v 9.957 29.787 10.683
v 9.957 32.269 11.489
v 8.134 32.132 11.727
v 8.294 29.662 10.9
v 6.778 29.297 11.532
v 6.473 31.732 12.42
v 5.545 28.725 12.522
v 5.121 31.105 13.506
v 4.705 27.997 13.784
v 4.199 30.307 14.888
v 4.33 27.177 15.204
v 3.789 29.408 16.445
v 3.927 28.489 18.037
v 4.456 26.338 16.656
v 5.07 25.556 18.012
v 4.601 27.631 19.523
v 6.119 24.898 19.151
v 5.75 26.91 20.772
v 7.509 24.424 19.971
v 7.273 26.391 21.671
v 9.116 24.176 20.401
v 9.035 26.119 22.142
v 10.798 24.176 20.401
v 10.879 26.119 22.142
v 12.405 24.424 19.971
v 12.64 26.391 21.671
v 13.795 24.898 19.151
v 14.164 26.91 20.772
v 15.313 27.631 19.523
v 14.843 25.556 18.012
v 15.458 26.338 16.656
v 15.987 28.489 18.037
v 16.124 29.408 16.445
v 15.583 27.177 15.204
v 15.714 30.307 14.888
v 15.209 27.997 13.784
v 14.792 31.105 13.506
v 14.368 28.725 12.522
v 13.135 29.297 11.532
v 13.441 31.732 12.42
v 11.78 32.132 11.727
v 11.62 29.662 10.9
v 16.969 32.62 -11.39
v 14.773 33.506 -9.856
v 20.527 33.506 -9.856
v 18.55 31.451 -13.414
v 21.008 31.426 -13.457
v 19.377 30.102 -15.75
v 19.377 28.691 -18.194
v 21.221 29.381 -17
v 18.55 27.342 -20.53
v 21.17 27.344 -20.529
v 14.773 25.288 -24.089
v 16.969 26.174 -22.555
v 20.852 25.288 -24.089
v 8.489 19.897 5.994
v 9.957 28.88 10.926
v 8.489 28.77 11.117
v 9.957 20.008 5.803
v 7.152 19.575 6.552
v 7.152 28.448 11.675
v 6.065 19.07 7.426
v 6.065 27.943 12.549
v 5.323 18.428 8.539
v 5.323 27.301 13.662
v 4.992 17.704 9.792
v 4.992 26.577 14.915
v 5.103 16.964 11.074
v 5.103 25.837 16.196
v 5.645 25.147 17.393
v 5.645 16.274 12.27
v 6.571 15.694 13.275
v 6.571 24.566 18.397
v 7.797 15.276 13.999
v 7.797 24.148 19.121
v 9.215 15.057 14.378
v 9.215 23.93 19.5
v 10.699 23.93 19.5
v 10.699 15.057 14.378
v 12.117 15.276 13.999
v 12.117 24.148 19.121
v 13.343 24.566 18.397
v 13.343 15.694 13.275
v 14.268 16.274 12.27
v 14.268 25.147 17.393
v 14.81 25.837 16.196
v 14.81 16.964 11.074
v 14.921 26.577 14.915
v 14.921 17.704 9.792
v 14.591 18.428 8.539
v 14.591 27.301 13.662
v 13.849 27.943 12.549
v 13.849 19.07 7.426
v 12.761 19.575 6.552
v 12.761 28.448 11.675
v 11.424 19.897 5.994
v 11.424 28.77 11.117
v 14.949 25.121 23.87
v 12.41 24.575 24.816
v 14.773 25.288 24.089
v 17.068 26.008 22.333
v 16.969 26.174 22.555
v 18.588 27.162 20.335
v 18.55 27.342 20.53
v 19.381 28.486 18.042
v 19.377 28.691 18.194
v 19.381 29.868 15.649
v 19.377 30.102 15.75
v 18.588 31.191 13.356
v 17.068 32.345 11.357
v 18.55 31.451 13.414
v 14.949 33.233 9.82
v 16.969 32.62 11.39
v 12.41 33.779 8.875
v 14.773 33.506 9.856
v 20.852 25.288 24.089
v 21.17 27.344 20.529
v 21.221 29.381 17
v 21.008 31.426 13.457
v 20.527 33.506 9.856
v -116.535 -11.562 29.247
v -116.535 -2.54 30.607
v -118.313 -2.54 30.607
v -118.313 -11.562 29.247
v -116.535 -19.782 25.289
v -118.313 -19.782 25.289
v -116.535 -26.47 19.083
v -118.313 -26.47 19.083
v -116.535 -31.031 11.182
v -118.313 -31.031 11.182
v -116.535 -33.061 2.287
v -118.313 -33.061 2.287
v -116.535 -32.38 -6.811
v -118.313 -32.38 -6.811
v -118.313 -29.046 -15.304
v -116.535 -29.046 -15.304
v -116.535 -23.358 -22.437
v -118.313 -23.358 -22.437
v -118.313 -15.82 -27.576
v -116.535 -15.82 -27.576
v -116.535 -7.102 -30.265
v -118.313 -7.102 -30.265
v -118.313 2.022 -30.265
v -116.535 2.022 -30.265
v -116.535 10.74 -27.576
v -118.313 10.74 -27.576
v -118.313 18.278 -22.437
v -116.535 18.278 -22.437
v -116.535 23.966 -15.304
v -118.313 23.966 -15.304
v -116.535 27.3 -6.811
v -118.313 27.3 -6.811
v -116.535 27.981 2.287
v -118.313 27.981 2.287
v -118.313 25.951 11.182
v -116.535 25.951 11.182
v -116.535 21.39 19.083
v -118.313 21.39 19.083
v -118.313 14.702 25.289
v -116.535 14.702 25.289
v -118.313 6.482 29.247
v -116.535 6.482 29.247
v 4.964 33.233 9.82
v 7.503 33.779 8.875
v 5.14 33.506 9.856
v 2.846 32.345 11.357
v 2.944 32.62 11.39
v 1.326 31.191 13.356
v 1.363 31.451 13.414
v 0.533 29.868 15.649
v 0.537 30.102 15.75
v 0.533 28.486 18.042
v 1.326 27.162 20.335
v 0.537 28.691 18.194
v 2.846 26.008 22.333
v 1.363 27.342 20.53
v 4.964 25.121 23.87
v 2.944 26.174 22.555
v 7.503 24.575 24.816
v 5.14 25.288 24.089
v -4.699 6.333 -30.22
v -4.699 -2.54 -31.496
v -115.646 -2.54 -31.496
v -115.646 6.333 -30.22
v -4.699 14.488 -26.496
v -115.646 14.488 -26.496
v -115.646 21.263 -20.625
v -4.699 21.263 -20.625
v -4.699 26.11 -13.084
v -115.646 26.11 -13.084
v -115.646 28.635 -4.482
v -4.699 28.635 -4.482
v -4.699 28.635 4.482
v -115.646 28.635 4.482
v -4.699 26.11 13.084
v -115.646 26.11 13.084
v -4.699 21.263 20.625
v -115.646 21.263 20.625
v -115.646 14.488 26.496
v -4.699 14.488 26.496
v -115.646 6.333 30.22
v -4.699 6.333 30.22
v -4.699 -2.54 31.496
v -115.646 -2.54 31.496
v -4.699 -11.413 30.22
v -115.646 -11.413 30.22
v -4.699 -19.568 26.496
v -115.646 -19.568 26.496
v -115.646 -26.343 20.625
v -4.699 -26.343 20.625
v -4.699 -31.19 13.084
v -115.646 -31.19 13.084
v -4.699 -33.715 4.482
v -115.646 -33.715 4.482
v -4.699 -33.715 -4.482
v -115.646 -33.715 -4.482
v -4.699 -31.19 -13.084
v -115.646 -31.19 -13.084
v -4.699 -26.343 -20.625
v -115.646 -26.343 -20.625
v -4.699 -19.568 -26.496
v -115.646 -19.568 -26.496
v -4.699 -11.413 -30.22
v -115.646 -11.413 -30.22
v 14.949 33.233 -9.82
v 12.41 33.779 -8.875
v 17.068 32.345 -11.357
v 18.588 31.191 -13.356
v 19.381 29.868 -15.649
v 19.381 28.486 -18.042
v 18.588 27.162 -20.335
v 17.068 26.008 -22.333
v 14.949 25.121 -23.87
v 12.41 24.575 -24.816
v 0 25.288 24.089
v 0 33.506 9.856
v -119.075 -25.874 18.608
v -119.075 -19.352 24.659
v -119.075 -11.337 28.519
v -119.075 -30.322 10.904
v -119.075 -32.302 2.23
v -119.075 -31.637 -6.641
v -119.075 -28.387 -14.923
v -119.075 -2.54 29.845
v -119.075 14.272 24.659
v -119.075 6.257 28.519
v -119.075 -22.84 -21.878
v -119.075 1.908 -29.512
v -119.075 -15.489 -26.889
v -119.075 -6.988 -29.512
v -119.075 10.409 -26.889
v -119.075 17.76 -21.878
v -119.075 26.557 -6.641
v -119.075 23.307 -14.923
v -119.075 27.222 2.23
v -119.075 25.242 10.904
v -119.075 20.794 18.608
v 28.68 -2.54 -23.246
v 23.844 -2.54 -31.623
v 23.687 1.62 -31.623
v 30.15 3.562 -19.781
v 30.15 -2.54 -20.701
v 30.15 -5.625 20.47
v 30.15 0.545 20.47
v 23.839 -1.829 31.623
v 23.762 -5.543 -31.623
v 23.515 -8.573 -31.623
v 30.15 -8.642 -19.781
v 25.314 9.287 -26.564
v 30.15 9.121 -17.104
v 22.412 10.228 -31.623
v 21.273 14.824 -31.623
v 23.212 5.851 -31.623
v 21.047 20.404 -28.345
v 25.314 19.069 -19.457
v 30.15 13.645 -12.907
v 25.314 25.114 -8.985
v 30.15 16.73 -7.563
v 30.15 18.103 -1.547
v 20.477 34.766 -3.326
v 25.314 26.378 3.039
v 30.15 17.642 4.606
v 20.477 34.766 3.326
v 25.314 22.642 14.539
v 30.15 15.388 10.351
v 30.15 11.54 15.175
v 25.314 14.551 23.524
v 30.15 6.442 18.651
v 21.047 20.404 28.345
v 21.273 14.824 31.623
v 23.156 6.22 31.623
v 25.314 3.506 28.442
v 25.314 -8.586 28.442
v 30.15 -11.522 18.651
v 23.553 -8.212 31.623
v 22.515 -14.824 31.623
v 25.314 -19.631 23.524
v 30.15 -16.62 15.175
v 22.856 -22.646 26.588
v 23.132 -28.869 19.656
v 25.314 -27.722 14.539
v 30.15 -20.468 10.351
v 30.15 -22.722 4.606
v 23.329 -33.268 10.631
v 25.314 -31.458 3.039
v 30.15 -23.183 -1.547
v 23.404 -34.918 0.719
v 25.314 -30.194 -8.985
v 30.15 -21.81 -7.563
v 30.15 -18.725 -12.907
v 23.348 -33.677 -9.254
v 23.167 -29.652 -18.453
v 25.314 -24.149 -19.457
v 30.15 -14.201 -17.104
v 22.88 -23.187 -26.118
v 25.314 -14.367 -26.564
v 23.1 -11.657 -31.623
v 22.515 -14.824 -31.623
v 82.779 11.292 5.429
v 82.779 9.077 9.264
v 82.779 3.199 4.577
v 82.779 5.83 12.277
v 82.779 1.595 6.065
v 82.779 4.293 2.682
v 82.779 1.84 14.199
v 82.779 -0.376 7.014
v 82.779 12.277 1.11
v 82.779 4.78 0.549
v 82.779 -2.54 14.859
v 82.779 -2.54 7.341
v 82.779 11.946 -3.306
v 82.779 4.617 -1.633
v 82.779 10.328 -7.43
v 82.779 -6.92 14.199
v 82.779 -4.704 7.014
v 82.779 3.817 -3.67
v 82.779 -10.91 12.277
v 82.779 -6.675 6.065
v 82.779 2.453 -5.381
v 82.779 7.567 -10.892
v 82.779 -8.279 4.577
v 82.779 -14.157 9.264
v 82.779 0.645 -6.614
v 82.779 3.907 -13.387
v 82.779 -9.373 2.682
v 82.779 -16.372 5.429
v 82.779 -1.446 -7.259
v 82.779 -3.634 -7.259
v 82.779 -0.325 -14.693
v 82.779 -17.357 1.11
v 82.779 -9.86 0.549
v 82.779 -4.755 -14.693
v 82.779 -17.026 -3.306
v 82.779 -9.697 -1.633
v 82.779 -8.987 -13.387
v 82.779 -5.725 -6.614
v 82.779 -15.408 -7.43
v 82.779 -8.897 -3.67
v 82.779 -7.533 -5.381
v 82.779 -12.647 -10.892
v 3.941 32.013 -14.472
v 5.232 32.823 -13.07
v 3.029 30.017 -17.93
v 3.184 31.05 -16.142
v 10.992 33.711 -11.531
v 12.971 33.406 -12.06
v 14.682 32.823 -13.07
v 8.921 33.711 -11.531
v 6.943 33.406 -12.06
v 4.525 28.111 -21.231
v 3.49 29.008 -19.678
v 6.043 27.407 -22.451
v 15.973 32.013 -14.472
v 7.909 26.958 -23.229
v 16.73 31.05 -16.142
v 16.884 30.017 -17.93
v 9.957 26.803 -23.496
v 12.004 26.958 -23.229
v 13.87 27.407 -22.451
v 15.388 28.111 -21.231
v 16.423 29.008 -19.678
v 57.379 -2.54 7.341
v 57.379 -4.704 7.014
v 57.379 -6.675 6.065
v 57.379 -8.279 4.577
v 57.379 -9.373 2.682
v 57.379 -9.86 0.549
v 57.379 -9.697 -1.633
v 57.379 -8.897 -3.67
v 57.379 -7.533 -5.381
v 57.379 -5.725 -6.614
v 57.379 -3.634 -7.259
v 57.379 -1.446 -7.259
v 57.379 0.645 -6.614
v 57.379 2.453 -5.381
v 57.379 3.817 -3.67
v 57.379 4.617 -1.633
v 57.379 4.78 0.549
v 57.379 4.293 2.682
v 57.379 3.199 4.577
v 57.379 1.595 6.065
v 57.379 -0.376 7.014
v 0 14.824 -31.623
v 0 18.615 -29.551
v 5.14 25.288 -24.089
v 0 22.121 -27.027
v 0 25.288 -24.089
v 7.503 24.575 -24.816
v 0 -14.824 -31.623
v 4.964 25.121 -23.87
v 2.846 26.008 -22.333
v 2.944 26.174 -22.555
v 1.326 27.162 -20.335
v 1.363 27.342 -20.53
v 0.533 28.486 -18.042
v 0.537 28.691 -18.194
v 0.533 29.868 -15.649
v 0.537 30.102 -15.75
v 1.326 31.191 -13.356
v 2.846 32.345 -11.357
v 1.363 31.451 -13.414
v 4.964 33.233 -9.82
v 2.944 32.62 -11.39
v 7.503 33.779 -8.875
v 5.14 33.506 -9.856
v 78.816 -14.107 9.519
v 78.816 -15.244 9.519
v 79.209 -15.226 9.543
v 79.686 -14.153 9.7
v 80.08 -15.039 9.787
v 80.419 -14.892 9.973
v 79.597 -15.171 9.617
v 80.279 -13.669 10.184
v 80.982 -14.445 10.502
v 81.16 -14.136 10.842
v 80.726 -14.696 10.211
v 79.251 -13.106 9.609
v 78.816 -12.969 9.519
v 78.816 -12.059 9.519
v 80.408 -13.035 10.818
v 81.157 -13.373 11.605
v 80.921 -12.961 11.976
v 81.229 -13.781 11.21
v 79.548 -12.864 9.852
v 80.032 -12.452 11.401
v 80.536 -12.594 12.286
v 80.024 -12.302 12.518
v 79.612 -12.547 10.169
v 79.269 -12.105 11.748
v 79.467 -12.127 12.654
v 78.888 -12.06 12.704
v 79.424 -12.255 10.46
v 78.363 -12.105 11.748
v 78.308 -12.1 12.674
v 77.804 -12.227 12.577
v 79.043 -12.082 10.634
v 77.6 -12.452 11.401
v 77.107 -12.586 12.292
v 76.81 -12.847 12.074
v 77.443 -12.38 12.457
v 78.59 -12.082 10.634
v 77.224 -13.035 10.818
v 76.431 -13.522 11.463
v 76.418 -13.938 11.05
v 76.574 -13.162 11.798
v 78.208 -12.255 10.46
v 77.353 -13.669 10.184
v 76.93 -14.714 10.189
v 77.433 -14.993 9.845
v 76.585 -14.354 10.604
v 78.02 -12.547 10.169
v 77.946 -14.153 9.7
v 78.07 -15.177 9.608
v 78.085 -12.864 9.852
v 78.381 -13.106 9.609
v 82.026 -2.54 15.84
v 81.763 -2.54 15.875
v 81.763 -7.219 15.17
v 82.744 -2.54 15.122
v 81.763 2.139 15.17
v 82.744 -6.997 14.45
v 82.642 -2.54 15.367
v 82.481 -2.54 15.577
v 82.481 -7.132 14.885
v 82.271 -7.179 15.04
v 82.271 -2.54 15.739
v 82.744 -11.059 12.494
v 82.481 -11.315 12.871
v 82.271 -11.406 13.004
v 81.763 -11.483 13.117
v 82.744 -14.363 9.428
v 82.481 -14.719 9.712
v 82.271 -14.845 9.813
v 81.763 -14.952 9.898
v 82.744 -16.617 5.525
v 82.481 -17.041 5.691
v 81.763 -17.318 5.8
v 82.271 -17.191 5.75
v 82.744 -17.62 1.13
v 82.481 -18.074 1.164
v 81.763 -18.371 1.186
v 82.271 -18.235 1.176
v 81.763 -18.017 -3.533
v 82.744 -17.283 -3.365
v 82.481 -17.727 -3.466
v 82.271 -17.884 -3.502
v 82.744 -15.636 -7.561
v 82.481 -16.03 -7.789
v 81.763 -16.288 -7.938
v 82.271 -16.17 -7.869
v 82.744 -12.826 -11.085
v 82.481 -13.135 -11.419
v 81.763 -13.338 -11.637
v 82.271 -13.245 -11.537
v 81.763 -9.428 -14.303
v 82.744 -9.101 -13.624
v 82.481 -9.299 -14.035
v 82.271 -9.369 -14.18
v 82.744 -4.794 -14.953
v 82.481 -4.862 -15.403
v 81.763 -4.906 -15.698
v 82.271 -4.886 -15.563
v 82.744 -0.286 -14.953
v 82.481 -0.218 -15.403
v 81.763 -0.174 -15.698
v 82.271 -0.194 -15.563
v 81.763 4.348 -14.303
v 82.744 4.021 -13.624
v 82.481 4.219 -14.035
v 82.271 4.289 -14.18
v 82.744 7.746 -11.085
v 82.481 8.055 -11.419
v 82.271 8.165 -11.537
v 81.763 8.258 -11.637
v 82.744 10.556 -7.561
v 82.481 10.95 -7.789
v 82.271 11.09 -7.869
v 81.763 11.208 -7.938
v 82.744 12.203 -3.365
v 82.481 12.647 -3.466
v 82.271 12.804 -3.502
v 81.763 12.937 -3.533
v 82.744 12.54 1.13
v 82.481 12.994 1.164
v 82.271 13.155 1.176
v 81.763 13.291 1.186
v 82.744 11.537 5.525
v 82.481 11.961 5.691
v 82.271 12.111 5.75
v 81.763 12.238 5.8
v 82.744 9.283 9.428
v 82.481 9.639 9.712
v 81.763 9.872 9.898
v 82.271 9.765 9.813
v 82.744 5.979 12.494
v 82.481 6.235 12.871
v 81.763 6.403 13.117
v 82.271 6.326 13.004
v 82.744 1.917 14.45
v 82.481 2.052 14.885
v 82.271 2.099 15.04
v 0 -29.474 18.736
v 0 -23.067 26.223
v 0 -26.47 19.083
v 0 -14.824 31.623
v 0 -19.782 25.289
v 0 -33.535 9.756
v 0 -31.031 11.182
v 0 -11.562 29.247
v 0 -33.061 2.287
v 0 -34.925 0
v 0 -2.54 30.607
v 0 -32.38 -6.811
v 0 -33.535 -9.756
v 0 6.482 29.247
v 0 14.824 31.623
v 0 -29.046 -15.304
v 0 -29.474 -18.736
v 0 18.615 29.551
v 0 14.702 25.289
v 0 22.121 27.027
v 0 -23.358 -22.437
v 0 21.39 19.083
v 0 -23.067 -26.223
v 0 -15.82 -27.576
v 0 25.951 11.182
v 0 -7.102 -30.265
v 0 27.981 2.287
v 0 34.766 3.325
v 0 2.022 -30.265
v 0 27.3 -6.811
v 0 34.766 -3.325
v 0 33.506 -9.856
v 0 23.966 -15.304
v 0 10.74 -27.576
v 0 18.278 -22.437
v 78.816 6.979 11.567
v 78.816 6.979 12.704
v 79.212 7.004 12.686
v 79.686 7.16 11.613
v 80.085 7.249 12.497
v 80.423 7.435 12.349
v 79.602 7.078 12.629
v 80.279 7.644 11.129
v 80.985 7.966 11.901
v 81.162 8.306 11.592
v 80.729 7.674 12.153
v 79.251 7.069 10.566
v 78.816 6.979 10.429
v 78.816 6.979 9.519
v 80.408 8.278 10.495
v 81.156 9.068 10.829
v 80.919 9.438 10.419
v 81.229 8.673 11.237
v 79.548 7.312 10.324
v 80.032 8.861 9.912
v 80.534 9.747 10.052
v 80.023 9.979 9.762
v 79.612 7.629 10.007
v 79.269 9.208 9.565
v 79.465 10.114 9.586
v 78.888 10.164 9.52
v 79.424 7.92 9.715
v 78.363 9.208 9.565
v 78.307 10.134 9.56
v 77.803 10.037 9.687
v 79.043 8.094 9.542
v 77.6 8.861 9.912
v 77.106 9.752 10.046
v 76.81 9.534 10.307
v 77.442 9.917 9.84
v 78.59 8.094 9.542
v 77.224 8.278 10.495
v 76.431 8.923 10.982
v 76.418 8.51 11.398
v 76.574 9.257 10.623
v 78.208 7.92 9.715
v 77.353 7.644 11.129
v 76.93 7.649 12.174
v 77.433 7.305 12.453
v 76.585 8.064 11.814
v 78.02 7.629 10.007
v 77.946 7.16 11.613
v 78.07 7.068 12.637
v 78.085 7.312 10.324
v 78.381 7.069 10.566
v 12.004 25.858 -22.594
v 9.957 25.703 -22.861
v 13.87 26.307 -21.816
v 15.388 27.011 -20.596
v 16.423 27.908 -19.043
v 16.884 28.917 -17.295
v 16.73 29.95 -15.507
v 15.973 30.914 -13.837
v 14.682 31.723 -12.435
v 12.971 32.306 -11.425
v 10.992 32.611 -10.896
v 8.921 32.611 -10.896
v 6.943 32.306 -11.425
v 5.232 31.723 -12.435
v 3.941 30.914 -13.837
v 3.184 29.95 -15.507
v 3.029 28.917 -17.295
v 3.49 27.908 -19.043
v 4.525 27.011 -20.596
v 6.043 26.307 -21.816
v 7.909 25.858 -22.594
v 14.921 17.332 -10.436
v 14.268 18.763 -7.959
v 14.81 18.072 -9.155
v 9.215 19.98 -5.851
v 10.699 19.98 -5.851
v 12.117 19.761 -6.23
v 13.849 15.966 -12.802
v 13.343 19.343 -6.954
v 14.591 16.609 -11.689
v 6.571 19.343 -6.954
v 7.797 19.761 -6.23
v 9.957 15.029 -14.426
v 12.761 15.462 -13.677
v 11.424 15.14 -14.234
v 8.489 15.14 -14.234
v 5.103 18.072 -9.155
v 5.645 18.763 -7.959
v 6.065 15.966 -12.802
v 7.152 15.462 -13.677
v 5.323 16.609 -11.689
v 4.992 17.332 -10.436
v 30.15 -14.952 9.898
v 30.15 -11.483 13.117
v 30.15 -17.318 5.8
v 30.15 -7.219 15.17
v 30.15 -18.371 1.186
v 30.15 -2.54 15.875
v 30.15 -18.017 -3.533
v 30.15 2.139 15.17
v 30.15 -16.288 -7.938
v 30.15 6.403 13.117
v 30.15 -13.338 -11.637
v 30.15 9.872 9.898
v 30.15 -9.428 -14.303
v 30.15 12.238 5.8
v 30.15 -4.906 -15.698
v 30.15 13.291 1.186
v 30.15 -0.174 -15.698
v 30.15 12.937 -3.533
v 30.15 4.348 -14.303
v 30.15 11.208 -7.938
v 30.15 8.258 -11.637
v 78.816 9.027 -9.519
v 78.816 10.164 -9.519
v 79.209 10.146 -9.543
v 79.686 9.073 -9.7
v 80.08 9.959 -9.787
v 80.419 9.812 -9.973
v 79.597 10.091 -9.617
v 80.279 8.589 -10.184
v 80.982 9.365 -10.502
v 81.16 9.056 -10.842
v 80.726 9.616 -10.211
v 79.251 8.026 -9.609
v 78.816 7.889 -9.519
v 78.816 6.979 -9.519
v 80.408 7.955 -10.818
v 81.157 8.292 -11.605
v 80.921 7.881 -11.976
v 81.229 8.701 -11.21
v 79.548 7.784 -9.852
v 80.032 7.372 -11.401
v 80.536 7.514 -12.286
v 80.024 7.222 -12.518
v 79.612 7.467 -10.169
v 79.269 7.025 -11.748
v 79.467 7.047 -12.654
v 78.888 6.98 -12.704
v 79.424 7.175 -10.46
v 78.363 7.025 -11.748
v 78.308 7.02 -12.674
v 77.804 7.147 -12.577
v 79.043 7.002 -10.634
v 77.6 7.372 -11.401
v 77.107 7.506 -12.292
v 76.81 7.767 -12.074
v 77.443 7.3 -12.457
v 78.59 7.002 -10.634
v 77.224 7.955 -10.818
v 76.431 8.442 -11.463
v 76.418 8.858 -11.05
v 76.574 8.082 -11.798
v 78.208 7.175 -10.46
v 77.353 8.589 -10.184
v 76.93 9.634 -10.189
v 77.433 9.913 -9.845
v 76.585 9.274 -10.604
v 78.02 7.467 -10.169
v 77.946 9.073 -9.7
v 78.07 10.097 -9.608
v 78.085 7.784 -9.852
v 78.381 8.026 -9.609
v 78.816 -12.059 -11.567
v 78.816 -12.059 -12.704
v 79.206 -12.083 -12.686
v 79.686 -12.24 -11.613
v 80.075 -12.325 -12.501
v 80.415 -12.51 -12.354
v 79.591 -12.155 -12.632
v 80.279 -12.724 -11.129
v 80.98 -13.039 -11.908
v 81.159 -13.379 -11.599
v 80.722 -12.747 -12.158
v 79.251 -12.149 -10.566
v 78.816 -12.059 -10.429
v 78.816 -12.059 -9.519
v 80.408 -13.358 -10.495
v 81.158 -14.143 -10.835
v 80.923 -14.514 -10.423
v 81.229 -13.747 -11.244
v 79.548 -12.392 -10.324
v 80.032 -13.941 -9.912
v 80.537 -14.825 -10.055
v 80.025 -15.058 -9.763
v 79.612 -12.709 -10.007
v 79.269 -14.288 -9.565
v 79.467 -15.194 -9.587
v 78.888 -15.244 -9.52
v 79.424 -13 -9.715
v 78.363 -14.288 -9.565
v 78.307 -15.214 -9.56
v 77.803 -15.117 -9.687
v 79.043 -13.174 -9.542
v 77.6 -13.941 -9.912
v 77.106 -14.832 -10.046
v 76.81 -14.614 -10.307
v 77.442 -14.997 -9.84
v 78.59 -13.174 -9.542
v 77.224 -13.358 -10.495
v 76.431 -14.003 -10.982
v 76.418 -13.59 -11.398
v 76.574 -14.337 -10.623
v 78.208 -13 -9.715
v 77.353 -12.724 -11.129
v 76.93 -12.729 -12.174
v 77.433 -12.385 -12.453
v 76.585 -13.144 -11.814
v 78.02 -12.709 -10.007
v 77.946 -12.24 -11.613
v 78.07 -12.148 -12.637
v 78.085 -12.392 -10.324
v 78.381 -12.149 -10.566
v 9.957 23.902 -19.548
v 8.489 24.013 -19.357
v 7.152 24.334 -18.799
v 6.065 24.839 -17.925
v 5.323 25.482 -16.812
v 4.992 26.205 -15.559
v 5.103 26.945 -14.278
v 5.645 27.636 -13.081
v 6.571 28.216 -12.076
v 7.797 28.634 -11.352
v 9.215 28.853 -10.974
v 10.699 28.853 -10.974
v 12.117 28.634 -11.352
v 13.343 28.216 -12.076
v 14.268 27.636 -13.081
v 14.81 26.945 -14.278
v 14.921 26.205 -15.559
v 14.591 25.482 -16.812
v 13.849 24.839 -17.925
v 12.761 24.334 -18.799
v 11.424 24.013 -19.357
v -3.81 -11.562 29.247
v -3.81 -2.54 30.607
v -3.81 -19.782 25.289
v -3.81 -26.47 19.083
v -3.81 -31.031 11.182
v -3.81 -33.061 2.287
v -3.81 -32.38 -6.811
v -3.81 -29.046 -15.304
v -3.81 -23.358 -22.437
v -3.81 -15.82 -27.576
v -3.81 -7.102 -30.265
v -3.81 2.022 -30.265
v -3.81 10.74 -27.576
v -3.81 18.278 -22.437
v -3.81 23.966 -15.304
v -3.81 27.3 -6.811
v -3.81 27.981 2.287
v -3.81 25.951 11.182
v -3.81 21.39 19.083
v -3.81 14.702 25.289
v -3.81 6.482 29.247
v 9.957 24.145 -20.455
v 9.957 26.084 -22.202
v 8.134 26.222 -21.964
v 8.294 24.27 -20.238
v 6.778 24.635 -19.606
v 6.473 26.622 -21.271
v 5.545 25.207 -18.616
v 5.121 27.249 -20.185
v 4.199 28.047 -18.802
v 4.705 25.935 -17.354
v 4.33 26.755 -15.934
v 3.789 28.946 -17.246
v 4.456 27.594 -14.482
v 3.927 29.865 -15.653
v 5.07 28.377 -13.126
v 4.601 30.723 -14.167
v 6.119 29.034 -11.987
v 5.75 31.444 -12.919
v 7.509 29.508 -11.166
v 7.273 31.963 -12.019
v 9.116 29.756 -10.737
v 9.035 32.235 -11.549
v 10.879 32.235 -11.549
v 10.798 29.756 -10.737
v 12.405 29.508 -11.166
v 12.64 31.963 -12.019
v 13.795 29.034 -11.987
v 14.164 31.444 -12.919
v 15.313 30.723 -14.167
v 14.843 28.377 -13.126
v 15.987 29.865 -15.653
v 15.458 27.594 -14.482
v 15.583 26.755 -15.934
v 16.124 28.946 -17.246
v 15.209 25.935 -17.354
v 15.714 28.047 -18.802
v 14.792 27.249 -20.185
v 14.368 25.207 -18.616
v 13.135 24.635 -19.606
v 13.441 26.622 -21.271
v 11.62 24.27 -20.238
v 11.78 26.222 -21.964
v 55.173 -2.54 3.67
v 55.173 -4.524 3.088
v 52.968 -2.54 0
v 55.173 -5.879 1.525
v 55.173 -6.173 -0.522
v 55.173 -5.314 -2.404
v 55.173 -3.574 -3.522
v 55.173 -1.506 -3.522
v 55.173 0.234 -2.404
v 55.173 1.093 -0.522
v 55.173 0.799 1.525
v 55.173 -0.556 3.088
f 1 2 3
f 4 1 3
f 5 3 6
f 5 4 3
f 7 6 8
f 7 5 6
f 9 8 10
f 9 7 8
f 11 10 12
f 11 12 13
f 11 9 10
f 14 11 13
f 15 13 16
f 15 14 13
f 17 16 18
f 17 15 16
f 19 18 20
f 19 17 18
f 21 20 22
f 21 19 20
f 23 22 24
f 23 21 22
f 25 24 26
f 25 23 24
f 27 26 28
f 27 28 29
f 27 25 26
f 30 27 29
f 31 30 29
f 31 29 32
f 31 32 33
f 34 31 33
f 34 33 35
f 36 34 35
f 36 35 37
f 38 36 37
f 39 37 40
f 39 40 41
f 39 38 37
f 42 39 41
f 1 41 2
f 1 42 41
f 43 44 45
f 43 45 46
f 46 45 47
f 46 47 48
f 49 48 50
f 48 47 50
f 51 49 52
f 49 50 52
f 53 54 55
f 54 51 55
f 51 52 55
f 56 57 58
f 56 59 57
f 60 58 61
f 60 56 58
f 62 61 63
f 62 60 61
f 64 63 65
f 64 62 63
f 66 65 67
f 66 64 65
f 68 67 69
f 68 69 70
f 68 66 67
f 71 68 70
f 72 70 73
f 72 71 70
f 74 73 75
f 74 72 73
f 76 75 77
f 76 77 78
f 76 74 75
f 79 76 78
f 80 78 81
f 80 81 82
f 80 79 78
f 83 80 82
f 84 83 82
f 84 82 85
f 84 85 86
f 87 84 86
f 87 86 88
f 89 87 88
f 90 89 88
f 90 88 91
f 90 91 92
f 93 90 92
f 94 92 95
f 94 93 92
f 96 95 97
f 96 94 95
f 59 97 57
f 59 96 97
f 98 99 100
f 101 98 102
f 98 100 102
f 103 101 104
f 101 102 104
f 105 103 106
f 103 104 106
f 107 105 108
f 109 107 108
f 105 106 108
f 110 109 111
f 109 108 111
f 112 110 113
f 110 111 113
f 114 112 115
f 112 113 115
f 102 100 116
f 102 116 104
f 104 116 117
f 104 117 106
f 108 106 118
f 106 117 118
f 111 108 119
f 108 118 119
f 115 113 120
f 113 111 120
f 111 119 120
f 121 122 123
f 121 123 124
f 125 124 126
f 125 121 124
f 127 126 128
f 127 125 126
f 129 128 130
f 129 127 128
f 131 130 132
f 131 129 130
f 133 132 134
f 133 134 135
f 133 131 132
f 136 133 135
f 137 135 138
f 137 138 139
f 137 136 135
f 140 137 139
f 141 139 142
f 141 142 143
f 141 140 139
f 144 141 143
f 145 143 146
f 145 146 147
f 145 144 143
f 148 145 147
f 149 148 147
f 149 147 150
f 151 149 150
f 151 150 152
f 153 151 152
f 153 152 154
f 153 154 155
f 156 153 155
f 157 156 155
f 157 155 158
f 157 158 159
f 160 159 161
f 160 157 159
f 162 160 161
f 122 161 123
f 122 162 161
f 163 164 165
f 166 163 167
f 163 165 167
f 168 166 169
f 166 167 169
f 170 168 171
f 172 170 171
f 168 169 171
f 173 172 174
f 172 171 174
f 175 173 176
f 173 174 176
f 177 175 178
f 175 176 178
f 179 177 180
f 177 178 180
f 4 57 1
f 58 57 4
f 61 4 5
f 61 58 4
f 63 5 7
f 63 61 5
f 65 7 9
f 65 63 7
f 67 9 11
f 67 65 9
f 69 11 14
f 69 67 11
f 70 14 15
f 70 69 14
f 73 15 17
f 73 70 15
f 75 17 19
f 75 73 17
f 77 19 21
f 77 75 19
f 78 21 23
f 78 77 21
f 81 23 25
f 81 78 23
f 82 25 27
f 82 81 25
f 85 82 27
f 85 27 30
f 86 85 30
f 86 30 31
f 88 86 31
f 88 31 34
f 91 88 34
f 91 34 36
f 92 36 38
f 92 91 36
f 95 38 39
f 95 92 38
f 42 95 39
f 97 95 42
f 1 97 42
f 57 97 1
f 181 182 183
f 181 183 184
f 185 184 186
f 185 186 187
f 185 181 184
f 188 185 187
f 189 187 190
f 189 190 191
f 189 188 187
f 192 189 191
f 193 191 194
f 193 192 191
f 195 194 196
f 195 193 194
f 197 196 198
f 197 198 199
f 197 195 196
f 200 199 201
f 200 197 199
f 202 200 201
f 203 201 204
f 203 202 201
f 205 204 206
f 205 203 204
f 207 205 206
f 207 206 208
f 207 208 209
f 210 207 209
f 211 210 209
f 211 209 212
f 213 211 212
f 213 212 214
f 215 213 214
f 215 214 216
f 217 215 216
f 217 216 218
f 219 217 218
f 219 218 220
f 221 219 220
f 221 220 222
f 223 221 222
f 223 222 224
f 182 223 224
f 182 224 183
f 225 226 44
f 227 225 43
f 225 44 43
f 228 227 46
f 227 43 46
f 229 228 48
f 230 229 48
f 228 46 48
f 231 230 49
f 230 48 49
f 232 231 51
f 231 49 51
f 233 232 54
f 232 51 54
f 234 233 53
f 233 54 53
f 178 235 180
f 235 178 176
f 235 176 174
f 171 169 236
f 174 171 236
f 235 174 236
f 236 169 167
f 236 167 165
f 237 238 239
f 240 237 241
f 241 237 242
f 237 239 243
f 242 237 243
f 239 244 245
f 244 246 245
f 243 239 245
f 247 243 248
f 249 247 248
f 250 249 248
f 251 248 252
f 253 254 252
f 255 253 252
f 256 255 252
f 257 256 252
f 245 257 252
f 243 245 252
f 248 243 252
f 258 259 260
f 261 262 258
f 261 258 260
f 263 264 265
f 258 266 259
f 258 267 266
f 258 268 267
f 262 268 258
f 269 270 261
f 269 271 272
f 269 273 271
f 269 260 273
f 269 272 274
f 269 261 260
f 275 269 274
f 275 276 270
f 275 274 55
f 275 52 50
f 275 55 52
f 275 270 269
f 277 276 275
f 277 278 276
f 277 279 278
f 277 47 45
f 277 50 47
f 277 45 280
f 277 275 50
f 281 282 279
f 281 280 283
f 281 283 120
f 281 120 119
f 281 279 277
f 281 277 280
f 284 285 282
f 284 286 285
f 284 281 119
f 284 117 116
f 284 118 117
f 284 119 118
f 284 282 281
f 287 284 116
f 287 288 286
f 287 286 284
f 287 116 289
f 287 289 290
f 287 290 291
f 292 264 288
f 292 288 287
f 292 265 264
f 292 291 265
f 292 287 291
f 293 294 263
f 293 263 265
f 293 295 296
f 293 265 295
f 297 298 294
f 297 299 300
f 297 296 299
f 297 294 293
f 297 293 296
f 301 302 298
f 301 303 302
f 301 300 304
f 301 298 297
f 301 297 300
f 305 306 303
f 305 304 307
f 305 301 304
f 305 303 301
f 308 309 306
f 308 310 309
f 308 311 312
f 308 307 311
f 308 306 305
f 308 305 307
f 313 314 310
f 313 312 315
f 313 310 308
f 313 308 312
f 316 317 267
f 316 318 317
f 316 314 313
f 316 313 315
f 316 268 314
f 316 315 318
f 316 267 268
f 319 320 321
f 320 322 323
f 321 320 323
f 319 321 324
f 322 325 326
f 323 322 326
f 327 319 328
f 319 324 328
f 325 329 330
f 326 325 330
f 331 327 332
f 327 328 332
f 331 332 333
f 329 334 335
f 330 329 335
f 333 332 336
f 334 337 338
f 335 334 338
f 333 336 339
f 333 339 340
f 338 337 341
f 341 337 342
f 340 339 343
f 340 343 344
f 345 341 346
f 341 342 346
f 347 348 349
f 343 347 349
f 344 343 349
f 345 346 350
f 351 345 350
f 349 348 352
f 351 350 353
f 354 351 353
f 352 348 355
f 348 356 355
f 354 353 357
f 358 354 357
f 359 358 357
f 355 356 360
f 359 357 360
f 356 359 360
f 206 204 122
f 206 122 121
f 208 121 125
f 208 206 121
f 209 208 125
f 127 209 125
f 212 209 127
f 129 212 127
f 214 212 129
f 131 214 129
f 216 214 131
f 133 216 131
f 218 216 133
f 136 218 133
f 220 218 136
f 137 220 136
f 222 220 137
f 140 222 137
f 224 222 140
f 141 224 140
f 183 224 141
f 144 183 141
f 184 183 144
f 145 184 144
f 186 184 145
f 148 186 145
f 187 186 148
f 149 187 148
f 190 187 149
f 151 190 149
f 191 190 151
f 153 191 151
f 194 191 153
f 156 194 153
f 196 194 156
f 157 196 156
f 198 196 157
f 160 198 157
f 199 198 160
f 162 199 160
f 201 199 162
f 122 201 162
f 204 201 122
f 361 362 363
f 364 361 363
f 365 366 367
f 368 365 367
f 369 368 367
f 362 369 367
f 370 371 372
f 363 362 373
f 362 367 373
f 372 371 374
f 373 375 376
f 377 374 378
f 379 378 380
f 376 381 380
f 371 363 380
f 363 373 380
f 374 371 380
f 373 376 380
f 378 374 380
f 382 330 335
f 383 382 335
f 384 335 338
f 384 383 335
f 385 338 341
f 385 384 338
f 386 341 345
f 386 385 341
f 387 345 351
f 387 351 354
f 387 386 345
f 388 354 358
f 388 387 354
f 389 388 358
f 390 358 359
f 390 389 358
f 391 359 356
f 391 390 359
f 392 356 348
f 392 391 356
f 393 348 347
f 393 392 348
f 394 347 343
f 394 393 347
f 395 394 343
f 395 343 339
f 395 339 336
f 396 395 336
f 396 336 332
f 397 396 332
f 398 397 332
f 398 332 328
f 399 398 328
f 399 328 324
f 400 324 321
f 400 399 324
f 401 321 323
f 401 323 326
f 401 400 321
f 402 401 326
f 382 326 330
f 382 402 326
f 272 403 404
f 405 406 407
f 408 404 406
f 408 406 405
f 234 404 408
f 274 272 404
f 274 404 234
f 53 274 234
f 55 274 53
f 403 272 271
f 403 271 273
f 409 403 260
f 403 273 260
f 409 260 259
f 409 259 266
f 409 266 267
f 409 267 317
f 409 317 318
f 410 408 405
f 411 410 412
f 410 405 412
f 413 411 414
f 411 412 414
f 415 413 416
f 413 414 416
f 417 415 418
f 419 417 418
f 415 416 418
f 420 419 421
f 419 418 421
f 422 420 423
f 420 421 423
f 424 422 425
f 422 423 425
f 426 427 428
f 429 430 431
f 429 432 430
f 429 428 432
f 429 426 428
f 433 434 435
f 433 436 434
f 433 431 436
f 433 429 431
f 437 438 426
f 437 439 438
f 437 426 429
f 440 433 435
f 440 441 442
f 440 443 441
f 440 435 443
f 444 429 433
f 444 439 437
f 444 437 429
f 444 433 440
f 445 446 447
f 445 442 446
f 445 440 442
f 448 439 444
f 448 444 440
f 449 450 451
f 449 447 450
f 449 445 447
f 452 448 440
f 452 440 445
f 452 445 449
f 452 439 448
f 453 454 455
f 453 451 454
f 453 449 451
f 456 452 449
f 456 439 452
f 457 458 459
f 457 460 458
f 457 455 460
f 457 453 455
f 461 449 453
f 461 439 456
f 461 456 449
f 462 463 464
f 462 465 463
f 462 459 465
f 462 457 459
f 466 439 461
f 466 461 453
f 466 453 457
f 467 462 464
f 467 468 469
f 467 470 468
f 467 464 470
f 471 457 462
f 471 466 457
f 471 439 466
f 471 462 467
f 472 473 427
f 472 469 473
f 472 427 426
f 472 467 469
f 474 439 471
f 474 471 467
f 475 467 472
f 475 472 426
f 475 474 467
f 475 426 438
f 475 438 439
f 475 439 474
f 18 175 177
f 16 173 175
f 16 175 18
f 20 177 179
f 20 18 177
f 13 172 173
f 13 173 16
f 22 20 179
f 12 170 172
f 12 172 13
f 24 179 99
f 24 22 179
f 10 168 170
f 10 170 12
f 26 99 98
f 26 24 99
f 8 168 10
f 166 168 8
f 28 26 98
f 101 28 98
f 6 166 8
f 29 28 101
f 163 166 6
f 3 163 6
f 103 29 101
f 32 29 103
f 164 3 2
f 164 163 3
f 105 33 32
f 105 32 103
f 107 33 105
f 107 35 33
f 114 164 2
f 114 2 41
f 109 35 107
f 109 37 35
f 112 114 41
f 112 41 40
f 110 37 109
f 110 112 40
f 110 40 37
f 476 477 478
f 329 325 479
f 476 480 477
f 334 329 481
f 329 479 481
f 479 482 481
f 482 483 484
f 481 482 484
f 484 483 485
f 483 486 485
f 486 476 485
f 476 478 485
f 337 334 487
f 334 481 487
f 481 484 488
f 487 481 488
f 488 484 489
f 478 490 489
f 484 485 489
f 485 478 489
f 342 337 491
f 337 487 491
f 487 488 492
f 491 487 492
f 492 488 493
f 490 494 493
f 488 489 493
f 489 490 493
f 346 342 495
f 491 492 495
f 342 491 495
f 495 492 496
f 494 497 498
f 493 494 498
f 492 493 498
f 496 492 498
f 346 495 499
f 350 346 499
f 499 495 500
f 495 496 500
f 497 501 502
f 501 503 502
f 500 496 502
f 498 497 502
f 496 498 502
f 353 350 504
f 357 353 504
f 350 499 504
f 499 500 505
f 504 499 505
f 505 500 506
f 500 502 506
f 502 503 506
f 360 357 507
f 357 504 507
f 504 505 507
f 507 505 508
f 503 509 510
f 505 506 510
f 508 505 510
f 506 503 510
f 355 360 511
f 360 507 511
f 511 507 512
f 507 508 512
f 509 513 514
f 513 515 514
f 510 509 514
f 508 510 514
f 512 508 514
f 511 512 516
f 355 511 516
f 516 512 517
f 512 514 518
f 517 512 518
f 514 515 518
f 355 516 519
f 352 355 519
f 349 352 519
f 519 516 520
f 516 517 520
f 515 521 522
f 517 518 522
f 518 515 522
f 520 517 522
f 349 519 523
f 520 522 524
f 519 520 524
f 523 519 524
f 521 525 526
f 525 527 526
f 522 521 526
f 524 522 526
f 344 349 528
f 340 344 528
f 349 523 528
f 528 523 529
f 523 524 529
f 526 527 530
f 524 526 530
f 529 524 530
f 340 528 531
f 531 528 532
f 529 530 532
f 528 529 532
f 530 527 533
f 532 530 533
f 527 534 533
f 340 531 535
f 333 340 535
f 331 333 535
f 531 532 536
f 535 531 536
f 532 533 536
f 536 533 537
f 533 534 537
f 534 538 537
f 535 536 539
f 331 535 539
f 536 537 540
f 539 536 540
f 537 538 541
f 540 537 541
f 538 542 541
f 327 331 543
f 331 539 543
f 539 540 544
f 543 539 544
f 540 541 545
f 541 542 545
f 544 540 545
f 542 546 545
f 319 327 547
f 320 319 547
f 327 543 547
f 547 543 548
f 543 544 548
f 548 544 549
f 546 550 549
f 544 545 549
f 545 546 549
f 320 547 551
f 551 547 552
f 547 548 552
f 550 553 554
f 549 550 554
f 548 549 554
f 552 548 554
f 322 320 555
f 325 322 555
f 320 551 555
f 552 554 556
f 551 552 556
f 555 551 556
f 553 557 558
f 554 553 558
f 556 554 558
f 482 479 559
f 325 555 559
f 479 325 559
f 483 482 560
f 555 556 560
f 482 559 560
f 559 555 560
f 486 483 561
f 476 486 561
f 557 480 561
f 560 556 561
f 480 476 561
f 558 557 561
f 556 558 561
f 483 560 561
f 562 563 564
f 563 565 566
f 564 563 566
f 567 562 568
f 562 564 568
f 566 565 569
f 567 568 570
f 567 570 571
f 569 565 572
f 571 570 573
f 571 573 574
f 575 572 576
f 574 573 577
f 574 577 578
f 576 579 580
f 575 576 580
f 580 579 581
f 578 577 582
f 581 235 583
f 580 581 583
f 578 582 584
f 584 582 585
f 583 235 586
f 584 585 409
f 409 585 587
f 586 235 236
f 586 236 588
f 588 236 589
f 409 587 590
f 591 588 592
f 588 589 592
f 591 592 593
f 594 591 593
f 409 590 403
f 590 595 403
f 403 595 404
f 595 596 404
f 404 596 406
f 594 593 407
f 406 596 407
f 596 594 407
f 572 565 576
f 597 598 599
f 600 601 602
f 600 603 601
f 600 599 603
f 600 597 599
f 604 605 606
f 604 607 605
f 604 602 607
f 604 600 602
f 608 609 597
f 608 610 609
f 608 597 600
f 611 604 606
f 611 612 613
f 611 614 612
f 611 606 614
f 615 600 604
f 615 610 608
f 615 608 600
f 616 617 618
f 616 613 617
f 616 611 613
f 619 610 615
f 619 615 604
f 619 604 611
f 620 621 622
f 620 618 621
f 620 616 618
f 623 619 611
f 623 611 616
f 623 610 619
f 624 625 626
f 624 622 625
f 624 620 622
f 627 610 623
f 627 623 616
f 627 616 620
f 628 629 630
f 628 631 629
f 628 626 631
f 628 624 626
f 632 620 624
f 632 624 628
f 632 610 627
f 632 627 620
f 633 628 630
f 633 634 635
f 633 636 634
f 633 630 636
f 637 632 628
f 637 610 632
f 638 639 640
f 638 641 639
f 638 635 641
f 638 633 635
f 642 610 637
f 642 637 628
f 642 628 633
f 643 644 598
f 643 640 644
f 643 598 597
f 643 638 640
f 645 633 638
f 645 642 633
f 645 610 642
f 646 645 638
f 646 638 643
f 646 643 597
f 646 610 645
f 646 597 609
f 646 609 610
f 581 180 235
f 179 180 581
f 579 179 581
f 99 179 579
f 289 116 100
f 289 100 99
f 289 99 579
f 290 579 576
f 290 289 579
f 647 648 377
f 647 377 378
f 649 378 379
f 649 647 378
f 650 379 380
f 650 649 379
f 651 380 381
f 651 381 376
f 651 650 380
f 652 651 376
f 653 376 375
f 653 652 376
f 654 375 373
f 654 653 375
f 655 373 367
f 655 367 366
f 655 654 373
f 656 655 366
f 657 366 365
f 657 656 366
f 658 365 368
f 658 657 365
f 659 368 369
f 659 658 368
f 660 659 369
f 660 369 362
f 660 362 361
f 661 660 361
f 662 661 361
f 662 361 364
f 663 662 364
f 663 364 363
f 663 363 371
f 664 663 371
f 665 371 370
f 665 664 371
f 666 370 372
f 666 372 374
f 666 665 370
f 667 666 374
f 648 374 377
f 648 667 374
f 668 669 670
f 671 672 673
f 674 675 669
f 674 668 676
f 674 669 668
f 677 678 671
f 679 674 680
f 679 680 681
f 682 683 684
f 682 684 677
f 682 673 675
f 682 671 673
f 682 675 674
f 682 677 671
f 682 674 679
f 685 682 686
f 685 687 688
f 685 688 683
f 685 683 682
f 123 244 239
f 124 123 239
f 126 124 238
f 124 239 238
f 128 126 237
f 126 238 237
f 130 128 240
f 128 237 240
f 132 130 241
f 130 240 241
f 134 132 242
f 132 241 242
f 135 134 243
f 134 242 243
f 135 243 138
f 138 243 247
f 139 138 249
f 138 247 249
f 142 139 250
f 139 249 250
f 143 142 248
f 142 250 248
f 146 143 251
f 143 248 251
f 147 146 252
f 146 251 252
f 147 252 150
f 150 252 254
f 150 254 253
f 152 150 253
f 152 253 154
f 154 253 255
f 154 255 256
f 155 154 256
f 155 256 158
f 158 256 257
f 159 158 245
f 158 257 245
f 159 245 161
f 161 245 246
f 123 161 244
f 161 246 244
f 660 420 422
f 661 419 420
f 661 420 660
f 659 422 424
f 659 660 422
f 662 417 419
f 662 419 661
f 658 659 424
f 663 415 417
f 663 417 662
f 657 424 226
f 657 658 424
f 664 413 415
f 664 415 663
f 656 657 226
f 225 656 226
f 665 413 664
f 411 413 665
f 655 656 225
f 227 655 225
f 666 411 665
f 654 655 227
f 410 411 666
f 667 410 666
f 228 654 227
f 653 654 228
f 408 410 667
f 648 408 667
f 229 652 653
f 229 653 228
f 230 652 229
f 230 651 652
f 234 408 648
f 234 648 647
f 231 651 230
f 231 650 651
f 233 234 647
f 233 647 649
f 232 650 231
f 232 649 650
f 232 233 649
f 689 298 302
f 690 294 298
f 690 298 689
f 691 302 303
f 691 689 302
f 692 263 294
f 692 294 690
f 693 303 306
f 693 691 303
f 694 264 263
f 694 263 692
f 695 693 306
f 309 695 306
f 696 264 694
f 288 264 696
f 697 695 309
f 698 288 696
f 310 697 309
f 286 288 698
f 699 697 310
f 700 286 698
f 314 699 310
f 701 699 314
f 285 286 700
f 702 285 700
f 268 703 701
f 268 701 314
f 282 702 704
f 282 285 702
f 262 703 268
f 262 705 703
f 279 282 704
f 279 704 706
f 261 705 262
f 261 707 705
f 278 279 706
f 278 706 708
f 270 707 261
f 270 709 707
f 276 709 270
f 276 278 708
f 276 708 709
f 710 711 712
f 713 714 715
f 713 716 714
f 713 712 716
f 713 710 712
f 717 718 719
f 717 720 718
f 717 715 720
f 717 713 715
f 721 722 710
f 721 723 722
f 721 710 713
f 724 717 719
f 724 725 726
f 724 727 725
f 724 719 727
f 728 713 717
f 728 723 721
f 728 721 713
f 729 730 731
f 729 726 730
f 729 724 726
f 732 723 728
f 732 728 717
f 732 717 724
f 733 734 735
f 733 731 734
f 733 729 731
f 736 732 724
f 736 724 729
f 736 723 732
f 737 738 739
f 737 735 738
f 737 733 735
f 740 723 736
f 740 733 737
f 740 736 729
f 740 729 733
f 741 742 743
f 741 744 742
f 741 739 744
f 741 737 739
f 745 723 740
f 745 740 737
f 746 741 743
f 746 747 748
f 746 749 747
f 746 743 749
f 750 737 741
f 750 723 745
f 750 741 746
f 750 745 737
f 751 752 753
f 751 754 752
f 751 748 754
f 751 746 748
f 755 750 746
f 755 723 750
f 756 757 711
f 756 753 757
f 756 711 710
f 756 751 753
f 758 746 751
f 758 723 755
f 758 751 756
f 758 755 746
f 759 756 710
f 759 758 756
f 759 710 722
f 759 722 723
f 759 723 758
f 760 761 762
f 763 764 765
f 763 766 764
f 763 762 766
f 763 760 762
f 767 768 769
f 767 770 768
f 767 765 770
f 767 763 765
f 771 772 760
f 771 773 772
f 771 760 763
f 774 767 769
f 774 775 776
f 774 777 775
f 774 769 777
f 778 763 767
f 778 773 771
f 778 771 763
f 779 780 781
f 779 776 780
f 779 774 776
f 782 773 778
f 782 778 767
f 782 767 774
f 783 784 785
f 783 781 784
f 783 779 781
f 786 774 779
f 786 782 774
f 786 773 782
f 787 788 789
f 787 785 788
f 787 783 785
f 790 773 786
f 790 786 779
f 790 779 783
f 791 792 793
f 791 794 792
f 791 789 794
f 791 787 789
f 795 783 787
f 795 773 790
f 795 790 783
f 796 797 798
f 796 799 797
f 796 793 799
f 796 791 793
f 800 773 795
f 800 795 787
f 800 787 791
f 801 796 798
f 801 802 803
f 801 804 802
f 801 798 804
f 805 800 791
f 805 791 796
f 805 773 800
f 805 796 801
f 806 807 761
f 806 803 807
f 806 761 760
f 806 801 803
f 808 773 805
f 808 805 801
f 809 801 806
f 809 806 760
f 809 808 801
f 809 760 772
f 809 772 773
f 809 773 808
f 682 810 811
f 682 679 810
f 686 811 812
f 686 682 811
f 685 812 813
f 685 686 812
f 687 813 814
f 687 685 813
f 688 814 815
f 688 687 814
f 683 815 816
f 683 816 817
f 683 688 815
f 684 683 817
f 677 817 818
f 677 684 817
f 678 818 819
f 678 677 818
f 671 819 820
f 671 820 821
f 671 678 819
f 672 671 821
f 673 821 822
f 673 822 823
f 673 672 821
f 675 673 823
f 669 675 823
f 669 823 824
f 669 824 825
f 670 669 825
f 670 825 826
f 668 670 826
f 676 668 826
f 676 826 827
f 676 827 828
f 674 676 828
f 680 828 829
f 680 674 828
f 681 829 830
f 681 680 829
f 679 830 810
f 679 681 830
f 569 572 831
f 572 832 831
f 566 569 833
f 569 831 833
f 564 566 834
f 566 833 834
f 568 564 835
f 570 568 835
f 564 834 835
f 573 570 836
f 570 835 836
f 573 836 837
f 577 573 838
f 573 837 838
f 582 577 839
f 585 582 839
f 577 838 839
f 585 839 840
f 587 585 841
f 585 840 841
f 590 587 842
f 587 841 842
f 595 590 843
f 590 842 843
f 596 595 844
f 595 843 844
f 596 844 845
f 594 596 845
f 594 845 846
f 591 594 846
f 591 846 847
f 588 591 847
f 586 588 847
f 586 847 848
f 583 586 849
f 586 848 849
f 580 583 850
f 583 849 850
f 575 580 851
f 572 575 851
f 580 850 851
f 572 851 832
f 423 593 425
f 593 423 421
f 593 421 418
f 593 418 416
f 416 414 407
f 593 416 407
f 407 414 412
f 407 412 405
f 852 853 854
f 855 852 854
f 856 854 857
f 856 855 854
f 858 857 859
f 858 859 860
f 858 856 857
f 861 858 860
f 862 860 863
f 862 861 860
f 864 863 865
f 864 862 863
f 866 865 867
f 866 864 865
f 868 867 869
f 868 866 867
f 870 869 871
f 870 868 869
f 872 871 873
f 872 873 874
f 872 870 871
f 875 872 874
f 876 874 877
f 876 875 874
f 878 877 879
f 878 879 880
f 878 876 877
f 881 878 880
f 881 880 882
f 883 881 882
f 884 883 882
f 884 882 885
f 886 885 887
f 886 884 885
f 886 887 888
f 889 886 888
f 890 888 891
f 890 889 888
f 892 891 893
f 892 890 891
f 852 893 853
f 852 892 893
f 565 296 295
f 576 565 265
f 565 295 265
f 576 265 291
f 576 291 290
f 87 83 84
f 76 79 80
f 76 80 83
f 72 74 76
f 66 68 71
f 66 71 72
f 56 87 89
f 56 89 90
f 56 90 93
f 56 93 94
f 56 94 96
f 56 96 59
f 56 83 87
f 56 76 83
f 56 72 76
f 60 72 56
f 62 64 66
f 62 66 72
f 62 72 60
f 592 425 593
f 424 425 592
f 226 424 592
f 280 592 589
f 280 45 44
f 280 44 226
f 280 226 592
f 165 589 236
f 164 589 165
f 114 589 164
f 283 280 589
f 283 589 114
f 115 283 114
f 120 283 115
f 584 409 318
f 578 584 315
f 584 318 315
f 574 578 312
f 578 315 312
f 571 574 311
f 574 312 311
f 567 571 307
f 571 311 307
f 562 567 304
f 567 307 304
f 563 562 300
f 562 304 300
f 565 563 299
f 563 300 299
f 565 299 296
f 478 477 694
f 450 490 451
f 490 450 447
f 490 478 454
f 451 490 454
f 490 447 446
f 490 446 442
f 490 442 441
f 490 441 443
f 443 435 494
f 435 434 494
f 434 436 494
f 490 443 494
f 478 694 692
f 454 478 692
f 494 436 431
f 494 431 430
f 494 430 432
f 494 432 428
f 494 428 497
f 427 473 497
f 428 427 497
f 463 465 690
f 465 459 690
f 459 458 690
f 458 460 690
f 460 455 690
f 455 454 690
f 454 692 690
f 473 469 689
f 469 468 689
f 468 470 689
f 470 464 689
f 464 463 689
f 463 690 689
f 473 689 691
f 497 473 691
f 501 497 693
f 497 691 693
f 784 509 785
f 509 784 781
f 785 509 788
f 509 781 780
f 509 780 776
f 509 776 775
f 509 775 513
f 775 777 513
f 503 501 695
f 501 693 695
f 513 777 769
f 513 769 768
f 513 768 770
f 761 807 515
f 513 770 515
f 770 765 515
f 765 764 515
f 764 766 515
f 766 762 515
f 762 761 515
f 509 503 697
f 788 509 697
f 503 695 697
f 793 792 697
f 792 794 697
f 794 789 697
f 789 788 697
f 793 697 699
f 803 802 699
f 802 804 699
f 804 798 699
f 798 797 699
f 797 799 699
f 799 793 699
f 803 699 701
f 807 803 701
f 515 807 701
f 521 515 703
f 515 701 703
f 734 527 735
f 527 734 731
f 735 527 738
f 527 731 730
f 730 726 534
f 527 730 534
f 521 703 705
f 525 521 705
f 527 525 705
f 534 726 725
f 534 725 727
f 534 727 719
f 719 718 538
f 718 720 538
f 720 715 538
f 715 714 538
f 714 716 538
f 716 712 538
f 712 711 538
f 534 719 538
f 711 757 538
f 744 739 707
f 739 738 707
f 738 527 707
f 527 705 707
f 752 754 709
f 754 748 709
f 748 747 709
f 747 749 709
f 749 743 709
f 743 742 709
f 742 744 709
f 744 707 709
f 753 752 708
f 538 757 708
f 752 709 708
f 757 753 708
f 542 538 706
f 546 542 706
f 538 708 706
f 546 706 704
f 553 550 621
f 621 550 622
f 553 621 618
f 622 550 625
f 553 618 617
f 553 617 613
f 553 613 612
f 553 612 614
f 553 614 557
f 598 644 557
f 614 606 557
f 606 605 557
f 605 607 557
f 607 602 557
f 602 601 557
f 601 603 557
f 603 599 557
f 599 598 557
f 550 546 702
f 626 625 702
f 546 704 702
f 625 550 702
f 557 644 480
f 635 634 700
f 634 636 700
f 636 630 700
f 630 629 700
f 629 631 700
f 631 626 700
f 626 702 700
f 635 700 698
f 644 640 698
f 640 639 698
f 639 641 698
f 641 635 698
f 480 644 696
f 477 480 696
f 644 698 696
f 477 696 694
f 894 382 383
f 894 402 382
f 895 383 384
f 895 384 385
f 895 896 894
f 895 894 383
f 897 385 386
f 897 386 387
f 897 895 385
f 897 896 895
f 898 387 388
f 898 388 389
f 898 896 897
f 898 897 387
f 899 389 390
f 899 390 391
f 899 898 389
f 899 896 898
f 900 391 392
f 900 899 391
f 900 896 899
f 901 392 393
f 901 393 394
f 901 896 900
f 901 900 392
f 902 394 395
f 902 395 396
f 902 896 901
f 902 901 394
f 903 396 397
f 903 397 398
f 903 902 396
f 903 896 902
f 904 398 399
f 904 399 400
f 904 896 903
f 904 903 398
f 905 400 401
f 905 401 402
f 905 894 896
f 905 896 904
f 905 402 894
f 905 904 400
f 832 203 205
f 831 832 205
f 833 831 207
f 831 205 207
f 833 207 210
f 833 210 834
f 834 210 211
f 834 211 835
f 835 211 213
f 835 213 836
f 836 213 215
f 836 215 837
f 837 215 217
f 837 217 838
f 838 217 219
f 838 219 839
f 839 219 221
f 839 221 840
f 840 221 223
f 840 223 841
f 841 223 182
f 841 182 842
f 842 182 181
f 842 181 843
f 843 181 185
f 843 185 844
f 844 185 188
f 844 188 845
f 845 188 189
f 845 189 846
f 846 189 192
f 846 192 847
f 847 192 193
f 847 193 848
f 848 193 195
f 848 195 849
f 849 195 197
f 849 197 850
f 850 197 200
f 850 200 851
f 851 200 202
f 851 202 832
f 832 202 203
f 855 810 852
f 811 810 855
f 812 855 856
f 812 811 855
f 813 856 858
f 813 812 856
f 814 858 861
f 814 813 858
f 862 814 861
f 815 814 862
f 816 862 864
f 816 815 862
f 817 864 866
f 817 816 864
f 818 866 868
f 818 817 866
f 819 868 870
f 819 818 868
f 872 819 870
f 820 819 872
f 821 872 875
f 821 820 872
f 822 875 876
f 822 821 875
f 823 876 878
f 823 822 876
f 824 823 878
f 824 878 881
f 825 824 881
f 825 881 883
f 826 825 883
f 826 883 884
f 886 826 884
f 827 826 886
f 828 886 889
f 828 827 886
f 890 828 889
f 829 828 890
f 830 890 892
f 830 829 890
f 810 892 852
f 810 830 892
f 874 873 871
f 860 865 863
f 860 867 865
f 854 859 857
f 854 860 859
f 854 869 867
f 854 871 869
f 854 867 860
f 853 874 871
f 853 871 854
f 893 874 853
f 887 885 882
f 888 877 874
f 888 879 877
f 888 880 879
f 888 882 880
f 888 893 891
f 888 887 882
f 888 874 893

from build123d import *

# Parameters (mm, degrees)
SKETCH1_R           = 34.925
EXTRUDE1_DEPTH      = 30.1498
EXTRUDE1_DEPTH_BACK = 119.0752
CUT_EXTRUDE1_REACH  = 121.075
SKETCH2_R           = 34.925
SKETCH2_R_2         = 31.496
CUT_EXTRUDE3_START  = -30.1498
SKETCH4_R           = 41.275
CUT_EXTRUDE3_DEPTH  = 30.1498
SKETCH18_R          = 9.525
CUT_EXTRUDE4_DEPTH  = 0.254
SKETCH19_R          = 9.525
CUT_EXTRUDE5_DEPTH  = 0.254
CHAMFER1_SIZE       = 0.762
SKETCH15_R          = 6.9469
EXTRUDE2_DEPTH      = 1.27
CIRPATTERN1_COUNT   = 4


with BuildPart() as part:
    # Sketch1 → Extrude1 (new body, two sides)
    with BuildSketch(Plane(origin=(0, 0, 0), x_dir=(0, 0, -1), z_dir=(1, 0, 0))) as extrude1_sk:
        Circle(SKETCH1_R)
    extrude(amount=EXTRUDE1_DEPTH)
    extrude(extrude1_sk.sketch, amount=-EXTRUDE1_DEPTH_BACK)

    # Sketch2 → Cut-Extrude1 (cut, up to next)
    with BuildSketch(Plane(origin=(0, 0, 0), x_dir=(0, 0, -1), z_dir=(1, 0, 0)), mode=Mode.PRIVATE) as cut_extrude1_sk1:
        Circle(SKETCH2_R)
        with Locations((0, -2.54)):
            Circle(SKETCH2_R_2, mode=Mode.SUBTRACT)
    cut_extrude1_tool1 = extrude(cut_extrude1_sk1.sketch, amount=-CUT_EXTRUDE1_REACH, mode=Mode.PRIVATE) & part.part
    add(cut_extrude1_tool1.solids().sort_by_distance((0, 0, 33.937172))[0], mode=Mode.SUBTRACT)

    # Sketch4 → Cut-Extrude3 (cut)
    with BuildSketch(Plane.ZY.offset(CUT_EXTRUDE3_START)):
        Circle(SKETCH4_R)
        with BuildLine():
            Line((31.623, -14.823680245), (31.623, 20.938179637))
            Line((31.623, 20.938179637), (0, 39.195727199))
            Line((0, 39.195727199), (-31.623, 20.938179637))
            Line((-31.623, 20.938179637), (-31.623, -14.823680245))
            ThreePointArc((-31.623, -14.823680245), (0, -34.925), (31.623, -14.823680245))
        make_face(mode=Mode.SUBTRACT)
    extrude(amount=CUT_EXTRUDE3_DEPTH, mode=Mode.SUBTRACT)

    # Sketch6 → Cut-Revolve2 (revolve, cut)
    with BuildSketch(Plane.XY, mode=Mode.PRIVATE) as cut_revolve2_sk:
        Polygon((0.307141936, 69.85), (30.1498, 18.161), (30.1498, 69.85), align=None)
    revolve(cut_revolve2_sk.sketch.rotate(Axis((-1.184990967, -2.54, 0), (1, 0, 0)), 270), axis=Axis((-1.184990967, -2.54, 0), (1, 0, 0)), mode=Mode.SUBTRACT)  # turned: the seam where the file's is

    # S2D0002 → Cut-Revolve3 (revolve, cut)
    with BuildSketch(Plane(origin=(9.9568, 29.176824947, 16.845247737), x_dir=(0, 0.5, -0.866025404), z_dir=(1, 0, 0))):
        Polygon((0, 0), (6.1849, 0), (5.642306865, -2.5527), (4.9784, -3.216606865), (4.9784, -13.462), (0, -13.462), align=None)
    revolve(axis=Axis((9.9568, 16.935469262, 9.777697737), (0, 0.866025404, 0.5)), mode=Mode.SUBTRACT)

    # Sketch8 → Cut-Revolve4 (revolve, cut)
    with BuildSketch(Plane(origin=(9.9568, 29.176824947, -16.845247737), x_dir=(0, -0.5, -0.866025404), z_dir=(1, 0, 0))):
        Polygon((0, 0), (6.1849, 0), (5.642306865, -2.5527), (4.9784, -3.216606865), (4.9784, -13.462), (0, -13.462), align=None)
    revolve(axis=Axis((9.9568, 16.935469262, -9.777697737), (0, 0.866025404, -0.5)), mode=Mode.SUBTRACT)

    # Sketch18 → Cut-Extrude4 (cut)
    with BuildSketch(Plane(origin=(0, 29.396795399, 16.972247737), x_dir=(1, 0, 0), z_dir=(0, 0.866025404, 0.5))):
        with Locations((9.9568, 0)):
            Circle(SKETCH18_R)
    extrude(amount=-CUT_EXTRUDE4_DEPTH, mode=Mode.SUBTRACT)

    # Sketch19 → Cut-Extrude5 (cut)
    with BuildSketch(Plane(origin=(0, 29.396795399, -16.972247737), x_dir=(1, 0, 0), z_dir=(0, 0.866025404, -0.5))):
        with Locations((9.9568, 0)):
            Circle(SKETCH19_R)
    extrude(amount=-CUT_EXTRUDE5_DEPTH, mode=Mode.SUBTRACT)

    # Sketch10 → Cut-Revolve6 (revolve, cut)
    with BuildSketch(Plane.XY, mode=Mode.PRIVATE) as cut_revolve6_sk:
        Polygon((0, 28.956), (0, 28.067), (-3.81, 28.067), (-4.699, 28.956), align=None)
    revolve(cut_revolve6_sk.sketch.rotate(Axis((-4.93395, -2.54, 0), (1, 0, 0)), 90), axis=Axis((-4.93395, -2.54, 0), (1, 0, 0)), mode=Mode.SUBTRACT)  # turned: the seam where the file's is

    # Sketch12 → Cut-Revolve8 (revolve, cut)
    with BuildSketch(Plane.XY, mode=Mode.PRIVATE) as cut_revolve8_sk:
        Polygon((-119.0752, 28.956), (-119.0752, 28.067), (-116.5352, 28.067), (-115.6462, 28.956), align=None)
    revolve(cut_revolve8_sk.sketch.rotate(Axis((-119.24665, -2.54, 0), (1, 0, 0)), 90), axis=Axis((-119.24665, -2.54, 0), (1, 0, 0)), mode=Mode.SUBTRACT)  # turned: the seam where the file's is

    # Chamfer1
    chamfer1_edges = [part.edges().sort_by_distance(p)[0] for p in [
        (-119.0752, -2.54, -30.607),
    ]]
    chamfer(chamfer1_edges, length=CHAMFER1_SIZE)

    # Sketch13 → Revolve1 (revolve)
    with BuildSketch(Plane(origin=(0, 0, 0), x_dir=(0, -1, 0), z_dir=(0, 0, 1)), mode=Mode.PRIVATE) as revolve1_sk:
        with BuildLine():
            Line((2.54, 30.1498), (2.54, 82.7786))
            Line((2.54, 82.7786), (17.399, 82.7786))
            ThreePointArc((17.399, 82.7786), (18.11742049, 82.48102049), (18.415, 81.7626))
            Line((18.415, 81.7626), (18.415, 30.1498))
            Line((18.415, 30.1498), (2.54, 30.1498))
        make_face()
    revolve(revolve1_sk.sketch.rotate(Axis((27.51836, -2.54, 0), (1, 0, 0)), 270), axis=Axis((27.51836, -2.54, 0), (1, 0, 0)))  # turned: the seam where the file's is

    # S2D0001 → Cut-Revolve9 (revolve, cut)
    with BuildSketch(Plane(origin=(82.7786, -9.8806, 0), x_dir=(0, -1, 0), z_dir=(0, 0, 1)), mode=Mode.PRIVATE) as cut_revolve9_sk:
        Polygon((0, 0), (0, -25.4), (-7.3406, -29.81067746), (-7.3406, 0), align=None)
    revolve(cut_revolve9_sk.sketch.rotate(Axis((51.477388667, -2.54, 0), (1, 0, 0)), 270), axis=Axis((51.477388667, -2.54, 0), (1, 0, 0)), mode=Mode.SUBTRACT)  # turned: the seam where the file's is

    # Sketch15 → Extrude2 (add)
    with BuildSketch(Plane(origin=(30.1498, 29.176824947, -16.845247737), x_dir=(0, -0.5, -0.866025404), z_dir=(0, -0.866025404, 0.5))):
        with Locations((0, -20.193)):
            Circle(SKETCH15_R)
    extrude(amount=-EXTRUDE2_DEPTH)

    # Sketch16 → Cut-Revolve10 (revolve, cut)
    with BuildSketch(Plane(origin=(78.8162, 8.685320151, -11.225320151), x_dir=(-1, 0, 0), z_dir=(0, -0.707106781, -0.707106781)), mode=Mode.PRIVATE) as cut_revolve10_sk:
        Polygon((0, 0), (2.413, 0), (0, -2.413), align=None)
    cut_revolve10 = revolve(cut_revolve10_sk.sketch.rotate(Axis((78.8162, 6.893759055, -9.433759055), (0, 0.707106781, -0.707106781)), 90), axis=Axis((78.8162, 6.893759055, -9.433759055), (0, 0.707106781, -0.707106781)), mode=Mode.SUBTRACT)  # turned: the seam where the file's is

    # CirPattern1: Cut-Revolve10 ×4 about axis
    cirpattern1_axis = Axis((27.51836, -2.54, 0), (-1, 0, 0))
    for i in range(1, CIRPATTERN1_COUNT):
        add(cut_revolve10.rotate(cirpattern1_axis, i * 360 / CIRPATTERN1_COUNT), mode=Mode.SUBTRACT)


solid = part.part
